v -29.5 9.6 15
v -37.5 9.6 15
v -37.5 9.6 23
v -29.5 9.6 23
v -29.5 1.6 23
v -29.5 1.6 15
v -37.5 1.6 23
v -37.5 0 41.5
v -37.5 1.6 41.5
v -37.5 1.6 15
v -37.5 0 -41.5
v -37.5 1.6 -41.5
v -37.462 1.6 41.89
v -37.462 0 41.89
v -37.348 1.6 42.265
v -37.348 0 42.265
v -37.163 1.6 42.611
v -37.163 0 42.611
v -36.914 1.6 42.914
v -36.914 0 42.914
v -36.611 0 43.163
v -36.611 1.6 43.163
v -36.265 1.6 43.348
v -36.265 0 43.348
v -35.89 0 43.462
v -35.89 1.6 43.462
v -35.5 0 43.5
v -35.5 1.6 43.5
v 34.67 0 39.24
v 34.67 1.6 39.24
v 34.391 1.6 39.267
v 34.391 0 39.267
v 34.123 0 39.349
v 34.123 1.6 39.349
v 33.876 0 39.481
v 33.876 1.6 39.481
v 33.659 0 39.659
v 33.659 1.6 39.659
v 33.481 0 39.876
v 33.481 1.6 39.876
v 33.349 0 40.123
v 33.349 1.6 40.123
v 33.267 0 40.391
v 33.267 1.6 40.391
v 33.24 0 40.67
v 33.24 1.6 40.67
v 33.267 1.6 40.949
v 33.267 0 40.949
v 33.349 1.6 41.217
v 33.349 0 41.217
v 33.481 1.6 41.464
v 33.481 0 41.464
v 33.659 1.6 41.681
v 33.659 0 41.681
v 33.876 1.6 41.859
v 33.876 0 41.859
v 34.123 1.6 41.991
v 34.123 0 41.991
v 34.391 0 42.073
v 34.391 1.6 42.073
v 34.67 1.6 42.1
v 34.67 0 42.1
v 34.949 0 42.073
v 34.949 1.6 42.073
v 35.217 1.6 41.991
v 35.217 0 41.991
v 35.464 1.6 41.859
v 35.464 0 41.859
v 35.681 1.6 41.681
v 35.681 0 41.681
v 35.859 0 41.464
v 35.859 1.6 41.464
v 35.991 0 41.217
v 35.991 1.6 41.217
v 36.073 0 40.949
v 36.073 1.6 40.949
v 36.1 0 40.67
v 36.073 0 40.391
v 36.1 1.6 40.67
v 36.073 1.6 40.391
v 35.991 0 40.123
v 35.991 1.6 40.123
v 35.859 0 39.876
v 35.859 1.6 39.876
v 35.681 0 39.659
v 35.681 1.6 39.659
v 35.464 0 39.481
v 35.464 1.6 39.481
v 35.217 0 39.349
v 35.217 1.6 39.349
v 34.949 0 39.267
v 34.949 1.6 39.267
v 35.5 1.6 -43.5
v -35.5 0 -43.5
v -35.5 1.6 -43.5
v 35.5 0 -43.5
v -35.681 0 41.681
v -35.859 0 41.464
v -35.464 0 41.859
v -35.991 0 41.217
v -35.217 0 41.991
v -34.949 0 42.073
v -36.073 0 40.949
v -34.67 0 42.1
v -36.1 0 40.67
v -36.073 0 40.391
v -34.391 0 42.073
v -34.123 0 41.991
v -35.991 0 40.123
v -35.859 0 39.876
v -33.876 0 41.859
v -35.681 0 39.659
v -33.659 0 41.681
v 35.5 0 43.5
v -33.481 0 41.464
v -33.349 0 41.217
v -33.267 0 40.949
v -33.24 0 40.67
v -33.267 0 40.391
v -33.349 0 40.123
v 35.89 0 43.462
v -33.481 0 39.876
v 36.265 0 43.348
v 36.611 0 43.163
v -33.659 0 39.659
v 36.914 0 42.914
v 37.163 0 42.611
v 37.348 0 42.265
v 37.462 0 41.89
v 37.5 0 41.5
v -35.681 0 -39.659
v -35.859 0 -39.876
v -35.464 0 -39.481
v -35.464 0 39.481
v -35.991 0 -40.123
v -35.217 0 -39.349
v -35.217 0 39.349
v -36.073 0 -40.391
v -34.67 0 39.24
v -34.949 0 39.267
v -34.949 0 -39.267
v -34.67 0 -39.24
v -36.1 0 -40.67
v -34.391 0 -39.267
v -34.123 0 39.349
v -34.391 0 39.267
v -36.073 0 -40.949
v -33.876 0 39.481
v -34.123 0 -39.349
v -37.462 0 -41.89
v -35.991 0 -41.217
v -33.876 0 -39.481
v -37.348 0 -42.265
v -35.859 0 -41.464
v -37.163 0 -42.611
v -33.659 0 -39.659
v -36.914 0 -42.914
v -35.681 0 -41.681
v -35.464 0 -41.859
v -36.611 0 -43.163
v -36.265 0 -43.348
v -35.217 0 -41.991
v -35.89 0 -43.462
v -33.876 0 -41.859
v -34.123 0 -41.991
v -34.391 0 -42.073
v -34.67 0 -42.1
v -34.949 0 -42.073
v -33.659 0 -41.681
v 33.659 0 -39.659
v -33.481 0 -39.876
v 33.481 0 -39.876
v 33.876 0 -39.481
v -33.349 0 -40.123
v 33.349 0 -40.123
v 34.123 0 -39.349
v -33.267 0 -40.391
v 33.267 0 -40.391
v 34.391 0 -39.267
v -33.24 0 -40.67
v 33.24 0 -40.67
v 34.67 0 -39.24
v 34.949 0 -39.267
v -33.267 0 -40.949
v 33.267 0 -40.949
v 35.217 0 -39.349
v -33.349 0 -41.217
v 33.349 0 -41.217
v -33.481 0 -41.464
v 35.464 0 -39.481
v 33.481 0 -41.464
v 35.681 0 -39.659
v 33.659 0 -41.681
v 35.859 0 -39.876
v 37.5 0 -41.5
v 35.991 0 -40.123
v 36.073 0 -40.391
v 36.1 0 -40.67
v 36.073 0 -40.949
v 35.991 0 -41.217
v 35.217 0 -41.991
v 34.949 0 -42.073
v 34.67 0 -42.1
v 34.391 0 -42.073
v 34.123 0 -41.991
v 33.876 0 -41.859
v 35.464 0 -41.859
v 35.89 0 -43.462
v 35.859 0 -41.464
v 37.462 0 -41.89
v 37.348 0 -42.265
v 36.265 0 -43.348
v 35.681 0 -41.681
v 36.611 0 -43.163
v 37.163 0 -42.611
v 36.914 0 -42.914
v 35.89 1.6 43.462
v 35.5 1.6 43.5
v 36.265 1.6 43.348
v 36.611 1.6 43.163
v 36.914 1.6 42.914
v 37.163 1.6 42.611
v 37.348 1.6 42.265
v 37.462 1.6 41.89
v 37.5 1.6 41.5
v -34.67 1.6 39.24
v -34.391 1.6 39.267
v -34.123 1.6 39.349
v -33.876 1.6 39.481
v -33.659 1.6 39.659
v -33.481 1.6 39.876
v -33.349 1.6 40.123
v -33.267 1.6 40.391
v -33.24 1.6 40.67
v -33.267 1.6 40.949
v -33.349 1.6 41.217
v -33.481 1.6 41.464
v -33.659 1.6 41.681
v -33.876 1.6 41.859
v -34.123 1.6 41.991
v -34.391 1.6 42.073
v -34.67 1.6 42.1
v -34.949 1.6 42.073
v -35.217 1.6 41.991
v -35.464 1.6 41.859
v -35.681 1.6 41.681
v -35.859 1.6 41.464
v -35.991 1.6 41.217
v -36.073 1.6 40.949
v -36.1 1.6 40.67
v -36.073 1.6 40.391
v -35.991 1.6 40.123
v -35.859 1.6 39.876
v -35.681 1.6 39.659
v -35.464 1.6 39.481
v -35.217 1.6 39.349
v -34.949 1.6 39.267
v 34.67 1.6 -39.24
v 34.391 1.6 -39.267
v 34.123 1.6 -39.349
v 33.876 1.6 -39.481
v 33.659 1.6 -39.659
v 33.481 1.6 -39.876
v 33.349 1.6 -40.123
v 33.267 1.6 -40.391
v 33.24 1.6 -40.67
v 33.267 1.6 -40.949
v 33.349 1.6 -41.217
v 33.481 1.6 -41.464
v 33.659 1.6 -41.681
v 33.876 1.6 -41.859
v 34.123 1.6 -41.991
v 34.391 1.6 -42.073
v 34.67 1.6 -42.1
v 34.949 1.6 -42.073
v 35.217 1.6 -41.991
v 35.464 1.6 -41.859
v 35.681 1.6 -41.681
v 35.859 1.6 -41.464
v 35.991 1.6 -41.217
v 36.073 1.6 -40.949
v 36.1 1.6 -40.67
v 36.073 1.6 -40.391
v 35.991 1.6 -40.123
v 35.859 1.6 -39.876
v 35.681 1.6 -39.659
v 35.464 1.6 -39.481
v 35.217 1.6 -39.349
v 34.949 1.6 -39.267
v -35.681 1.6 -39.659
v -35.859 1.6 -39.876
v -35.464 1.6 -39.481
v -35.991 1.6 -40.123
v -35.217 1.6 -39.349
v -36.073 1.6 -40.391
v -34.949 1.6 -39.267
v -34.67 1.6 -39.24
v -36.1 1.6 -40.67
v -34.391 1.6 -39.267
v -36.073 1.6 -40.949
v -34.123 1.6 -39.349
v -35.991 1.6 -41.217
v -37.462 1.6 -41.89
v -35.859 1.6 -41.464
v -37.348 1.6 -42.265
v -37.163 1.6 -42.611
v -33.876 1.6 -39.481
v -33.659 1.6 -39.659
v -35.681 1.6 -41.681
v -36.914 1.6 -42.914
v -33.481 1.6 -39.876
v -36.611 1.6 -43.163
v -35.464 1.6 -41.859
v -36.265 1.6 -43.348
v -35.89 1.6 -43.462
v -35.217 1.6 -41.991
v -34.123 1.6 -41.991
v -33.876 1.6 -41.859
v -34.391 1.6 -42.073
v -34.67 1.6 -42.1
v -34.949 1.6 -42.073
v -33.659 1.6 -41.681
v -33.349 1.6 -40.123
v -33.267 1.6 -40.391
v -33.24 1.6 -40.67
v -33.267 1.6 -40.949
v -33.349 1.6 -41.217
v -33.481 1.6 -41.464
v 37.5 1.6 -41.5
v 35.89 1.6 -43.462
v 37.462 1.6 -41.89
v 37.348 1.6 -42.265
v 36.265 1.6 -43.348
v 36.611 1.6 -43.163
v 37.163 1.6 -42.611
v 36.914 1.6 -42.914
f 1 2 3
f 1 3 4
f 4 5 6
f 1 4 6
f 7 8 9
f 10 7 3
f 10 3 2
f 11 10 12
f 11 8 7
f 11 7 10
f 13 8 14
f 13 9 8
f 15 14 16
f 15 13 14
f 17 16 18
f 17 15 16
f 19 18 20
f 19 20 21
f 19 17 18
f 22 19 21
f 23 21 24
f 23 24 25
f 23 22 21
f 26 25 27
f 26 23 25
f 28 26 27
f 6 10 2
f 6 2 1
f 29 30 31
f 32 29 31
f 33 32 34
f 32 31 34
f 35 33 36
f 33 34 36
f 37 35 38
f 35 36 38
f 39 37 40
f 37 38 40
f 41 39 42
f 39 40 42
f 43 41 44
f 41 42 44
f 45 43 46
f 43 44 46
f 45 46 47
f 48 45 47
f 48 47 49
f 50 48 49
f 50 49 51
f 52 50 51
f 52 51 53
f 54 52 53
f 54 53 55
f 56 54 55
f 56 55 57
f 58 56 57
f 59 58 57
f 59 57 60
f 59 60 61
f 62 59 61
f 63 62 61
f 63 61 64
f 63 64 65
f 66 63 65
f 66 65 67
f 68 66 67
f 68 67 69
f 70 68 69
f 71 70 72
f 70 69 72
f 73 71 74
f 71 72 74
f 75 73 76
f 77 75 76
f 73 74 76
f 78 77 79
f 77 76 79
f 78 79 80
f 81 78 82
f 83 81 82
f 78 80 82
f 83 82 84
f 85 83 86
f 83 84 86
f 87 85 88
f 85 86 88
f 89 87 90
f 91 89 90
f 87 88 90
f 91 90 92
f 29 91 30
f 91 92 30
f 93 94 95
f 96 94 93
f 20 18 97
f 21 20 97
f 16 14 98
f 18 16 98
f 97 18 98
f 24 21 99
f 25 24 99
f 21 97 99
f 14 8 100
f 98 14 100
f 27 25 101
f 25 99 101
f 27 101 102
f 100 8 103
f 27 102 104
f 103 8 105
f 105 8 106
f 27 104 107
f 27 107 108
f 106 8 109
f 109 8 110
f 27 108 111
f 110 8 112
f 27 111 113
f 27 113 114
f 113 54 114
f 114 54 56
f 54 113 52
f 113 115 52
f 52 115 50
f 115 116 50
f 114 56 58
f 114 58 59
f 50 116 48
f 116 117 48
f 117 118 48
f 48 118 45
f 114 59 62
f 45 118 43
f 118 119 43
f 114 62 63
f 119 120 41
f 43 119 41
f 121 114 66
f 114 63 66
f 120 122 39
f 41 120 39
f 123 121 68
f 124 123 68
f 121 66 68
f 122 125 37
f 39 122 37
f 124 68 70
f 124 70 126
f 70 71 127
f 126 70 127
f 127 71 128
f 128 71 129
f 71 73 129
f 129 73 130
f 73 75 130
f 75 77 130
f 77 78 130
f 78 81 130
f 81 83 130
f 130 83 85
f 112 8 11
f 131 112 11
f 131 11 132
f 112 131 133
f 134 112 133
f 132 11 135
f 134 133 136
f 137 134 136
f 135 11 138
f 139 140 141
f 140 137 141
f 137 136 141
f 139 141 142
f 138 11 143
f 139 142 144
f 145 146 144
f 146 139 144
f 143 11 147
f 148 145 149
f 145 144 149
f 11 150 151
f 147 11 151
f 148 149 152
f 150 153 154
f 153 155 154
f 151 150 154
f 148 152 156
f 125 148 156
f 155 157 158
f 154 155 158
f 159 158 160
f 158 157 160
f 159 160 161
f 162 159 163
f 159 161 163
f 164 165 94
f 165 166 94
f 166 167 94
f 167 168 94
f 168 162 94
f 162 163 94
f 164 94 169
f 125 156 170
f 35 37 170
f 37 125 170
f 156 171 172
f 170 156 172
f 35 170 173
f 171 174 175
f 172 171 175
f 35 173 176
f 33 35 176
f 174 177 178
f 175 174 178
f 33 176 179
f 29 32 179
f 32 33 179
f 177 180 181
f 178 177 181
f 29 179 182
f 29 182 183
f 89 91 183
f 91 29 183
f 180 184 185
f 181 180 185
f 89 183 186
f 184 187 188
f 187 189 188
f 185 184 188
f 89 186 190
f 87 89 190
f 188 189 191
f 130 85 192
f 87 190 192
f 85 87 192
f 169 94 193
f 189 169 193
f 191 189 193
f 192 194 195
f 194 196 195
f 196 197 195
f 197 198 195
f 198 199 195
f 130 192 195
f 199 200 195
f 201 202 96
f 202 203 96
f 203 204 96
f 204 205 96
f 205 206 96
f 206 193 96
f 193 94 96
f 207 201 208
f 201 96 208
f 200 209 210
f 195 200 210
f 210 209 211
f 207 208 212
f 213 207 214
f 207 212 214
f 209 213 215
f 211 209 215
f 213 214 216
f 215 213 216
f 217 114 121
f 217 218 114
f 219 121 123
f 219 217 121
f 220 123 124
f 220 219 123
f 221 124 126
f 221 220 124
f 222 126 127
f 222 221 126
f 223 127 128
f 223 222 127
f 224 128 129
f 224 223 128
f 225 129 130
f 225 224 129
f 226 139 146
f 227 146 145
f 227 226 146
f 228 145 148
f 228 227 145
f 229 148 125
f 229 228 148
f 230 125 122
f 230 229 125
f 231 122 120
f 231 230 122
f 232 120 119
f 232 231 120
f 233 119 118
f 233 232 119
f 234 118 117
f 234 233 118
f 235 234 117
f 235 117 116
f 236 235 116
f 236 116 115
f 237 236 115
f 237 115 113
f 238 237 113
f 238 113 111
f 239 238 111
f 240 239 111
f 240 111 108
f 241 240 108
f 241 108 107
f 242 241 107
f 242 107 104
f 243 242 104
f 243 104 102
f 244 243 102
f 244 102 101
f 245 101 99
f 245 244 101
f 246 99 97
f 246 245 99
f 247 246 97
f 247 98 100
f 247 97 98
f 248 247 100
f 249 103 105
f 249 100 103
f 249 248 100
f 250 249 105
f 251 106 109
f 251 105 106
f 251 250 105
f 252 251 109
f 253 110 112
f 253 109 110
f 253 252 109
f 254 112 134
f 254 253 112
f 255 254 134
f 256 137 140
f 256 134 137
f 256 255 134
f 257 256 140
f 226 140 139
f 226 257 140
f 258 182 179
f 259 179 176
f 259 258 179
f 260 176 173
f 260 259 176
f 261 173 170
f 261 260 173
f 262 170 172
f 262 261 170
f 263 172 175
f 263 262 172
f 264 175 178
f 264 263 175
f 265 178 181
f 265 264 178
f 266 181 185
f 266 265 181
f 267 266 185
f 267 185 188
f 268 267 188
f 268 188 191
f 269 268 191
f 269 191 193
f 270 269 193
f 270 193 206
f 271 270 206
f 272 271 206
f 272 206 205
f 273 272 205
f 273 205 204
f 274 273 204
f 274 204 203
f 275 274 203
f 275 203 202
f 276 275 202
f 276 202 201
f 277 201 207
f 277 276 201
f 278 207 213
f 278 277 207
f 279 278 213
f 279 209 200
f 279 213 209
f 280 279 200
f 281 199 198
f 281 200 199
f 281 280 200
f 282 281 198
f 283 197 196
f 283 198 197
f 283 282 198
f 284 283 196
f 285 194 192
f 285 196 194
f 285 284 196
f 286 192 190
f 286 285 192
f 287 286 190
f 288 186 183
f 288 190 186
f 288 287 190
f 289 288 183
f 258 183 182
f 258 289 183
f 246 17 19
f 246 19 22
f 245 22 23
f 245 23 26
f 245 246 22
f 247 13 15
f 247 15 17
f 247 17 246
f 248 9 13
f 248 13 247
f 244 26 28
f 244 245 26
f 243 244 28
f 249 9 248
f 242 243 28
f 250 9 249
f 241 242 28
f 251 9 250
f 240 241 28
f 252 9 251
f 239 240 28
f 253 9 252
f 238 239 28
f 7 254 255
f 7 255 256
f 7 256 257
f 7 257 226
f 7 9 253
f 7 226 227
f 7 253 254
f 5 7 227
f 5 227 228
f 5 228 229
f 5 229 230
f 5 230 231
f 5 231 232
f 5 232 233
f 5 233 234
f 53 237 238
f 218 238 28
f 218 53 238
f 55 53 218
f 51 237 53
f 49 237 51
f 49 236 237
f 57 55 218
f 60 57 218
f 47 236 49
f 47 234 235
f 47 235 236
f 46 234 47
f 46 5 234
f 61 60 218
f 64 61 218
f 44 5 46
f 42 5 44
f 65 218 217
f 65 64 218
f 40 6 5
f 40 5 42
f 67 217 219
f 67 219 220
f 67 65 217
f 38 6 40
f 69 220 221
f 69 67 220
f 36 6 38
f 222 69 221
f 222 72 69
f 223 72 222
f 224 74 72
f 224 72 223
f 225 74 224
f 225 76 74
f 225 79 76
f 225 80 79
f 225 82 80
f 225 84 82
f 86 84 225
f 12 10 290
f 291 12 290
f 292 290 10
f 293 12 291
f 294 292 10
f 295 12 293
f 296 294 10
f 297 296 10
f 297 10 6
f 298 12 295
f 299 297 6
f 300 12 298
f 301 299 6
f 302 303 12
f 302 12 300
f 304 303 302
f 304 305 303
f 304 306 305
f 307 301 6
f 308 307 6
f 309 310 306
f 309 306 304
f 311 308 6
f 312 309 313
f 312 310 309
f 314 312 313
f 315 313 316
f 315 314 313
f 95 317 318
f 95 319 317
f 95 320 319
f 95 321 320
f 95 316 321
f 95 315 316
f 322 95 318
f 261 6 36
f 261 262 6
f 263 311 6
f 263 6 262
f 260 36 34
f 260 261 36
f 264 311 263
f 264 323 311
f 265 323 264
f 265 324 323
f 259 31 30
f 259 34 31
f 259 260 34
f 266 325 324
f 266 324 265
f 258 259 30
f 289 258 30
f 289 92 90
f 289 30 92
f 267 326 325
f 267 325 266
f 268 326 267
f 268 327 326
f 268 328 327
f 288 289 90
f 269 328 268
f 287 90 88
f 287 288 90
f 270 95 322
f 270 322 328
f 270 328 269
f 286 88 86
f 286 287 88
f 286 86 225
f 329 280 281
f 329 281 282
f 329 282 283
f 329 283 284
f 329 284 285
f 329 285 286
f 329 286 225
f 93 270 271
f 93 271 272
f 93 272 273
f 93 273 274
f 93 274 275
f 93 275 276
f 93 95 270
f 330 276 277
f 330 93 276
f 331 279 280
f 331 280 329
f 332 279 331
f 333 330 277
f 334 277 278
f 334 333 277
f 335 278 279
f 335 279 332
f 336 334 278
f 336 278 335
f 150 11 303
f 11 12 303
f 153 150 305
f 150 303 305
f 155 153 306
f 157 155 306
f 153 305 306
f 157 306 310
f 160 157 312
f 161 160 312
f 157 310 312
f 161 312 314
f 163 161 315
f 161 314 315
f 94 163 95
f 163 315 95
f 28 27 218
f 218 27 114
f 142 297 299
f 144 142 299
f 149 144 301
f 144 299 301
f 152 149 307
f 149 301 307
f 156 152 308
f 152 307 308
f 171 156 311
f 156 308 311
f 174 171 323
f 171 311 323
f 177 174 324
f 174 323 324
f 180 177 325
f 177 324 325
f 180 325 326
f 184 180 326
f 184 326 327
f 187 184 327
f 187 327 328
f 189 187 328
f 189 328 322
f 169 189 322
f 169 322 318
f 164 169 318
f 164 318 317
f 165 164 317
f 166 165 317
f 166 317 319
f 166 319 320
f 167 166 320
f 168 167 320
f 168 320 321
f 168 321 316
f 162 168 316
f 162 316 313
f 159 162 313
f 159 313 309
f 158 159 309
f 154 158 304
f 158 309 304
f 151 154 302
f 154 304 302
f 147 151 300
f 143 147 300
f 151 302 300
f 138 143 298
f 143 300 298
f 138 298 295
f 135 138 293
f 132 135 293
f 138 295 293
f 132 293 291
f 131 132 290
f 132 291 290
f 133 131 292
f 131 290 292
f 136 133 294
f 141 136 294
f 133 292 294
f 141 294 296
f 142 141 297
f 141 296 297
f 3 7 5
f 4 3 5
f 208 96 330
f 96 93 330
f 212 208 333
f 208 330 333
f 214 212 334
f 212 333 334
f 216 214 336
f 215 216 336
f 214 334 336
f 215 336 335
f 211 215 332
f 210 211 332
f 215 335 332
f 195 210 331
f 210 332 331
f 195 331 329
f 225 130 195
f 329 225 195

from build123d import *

# Parameters (mm, degrees)
SKETCH1_W                                  = 75
SKETCH1_H                                  = 87
BOSS_EXTRUDE1_DEPTH                        = 1.6
SKETCH2_R                                  = 1.43
CUT_EXTRUDE1_DEPTH                         = 58.45485184
MIRROR1_AT_THE_SECOND_PLANE_COPY_1_SKETC_R = 1.43
MIRROR1_AT_THE_SECOND_PLANE_COPY_1_DEPTH   = 58.45485184
FILLET1_R                                  = 2
SKETCH3_W                                  = 8
SKETCH3_H                                  = 8
BOSS_EXTRUDE2_DEPTH                        = 8


with BuildPart() as part:
    # Sketch1 → Boss-Extrude1 (new body)
    with BuildSketch(Plane(origin=(0, 0, 0), x_dir=(1, 0, 0), z_dir=(0, 1, 0))):
        Rectangle(SKETCH1_W, SKETCH1_H)
    extrude(amount=BOSS_EXTRUDE1_DEPTH)

    # Sketch2 → Cut-Extrude1 (cut, through all)
    with BuildSketch(Plane(origin=(0, 1.6, 0), x_dir=(1, 0, 0), z_dir=(0, 1, 0))):
        with Locations(Location((-34.67, 40.67, 0), (0, 0, 270))):
            Circle(SKETCH2_R)
    cut_extrude1 = extrude(amount=-CUT_EXTRUDE1_DEPTH, mode=Mode.SUBTRACT)

    # Mirror1: Cut-Extrude1 across plane
    add(cut_extrude1.mirror(Plane.XY), mode=Mode.SUBTRACT)

    # Mirror1 at the second plane: Cut-Extrude1 across plane
    add(cut_extrude1.mirror(Plane(origin=(0, 0, 0), x_dir=(0, 0, 1), z_dir=(1, 0, 0))), mode=Mode.SUBTRACT)

    # Mirror1 at the second plane copy 1 sketc → Mirror1 at the second plane copy 1 (cut, through all)
    with BuildSketch(Plane(origin=(0, 1.6, 0), x_dir=(-1, 0, 0), z_dir=(0, 1, 0))):
        with Locations(Location((-34.67, 40.67, 0), (0, 0, 270))):
            Circle(MIRROR1_AT_THE_SECOND_PLANE_COPY_1_SKETC_R)
    extrude(amount=-MIRROR1_AT_THE_SECOND_PLANE_COPY_1_DEPTH, mode=Mode.SUBTRACT)

    # Fillet1
    fillet1_edges = [part.edges().sort_by_distance(p)[0] for p in [
        (-37.5, 0.8, 43.5),
        (-37.5, 0.8, -43.5),
        (37.5, 0.8, -43.5),
        (37.5, 0.8, 43.5),
    ]]
    fillet(fillet1_edges, radius=FILLET1_R)

    # Sketch3 → Boss-Extrude2 (add)
    with BuildSketch(Plane(origin=(0, 1.6, 0), x_dir=(1, 0, 0), z_dir=(0, 1, 0))):
        with Locations((-33.5, -19)):
            Rectangle(SKETCH3_W, SKETCH3_H)
    extrude(amount=BOSS_EXTRUDE2_DEPTH)


solid = part.part
